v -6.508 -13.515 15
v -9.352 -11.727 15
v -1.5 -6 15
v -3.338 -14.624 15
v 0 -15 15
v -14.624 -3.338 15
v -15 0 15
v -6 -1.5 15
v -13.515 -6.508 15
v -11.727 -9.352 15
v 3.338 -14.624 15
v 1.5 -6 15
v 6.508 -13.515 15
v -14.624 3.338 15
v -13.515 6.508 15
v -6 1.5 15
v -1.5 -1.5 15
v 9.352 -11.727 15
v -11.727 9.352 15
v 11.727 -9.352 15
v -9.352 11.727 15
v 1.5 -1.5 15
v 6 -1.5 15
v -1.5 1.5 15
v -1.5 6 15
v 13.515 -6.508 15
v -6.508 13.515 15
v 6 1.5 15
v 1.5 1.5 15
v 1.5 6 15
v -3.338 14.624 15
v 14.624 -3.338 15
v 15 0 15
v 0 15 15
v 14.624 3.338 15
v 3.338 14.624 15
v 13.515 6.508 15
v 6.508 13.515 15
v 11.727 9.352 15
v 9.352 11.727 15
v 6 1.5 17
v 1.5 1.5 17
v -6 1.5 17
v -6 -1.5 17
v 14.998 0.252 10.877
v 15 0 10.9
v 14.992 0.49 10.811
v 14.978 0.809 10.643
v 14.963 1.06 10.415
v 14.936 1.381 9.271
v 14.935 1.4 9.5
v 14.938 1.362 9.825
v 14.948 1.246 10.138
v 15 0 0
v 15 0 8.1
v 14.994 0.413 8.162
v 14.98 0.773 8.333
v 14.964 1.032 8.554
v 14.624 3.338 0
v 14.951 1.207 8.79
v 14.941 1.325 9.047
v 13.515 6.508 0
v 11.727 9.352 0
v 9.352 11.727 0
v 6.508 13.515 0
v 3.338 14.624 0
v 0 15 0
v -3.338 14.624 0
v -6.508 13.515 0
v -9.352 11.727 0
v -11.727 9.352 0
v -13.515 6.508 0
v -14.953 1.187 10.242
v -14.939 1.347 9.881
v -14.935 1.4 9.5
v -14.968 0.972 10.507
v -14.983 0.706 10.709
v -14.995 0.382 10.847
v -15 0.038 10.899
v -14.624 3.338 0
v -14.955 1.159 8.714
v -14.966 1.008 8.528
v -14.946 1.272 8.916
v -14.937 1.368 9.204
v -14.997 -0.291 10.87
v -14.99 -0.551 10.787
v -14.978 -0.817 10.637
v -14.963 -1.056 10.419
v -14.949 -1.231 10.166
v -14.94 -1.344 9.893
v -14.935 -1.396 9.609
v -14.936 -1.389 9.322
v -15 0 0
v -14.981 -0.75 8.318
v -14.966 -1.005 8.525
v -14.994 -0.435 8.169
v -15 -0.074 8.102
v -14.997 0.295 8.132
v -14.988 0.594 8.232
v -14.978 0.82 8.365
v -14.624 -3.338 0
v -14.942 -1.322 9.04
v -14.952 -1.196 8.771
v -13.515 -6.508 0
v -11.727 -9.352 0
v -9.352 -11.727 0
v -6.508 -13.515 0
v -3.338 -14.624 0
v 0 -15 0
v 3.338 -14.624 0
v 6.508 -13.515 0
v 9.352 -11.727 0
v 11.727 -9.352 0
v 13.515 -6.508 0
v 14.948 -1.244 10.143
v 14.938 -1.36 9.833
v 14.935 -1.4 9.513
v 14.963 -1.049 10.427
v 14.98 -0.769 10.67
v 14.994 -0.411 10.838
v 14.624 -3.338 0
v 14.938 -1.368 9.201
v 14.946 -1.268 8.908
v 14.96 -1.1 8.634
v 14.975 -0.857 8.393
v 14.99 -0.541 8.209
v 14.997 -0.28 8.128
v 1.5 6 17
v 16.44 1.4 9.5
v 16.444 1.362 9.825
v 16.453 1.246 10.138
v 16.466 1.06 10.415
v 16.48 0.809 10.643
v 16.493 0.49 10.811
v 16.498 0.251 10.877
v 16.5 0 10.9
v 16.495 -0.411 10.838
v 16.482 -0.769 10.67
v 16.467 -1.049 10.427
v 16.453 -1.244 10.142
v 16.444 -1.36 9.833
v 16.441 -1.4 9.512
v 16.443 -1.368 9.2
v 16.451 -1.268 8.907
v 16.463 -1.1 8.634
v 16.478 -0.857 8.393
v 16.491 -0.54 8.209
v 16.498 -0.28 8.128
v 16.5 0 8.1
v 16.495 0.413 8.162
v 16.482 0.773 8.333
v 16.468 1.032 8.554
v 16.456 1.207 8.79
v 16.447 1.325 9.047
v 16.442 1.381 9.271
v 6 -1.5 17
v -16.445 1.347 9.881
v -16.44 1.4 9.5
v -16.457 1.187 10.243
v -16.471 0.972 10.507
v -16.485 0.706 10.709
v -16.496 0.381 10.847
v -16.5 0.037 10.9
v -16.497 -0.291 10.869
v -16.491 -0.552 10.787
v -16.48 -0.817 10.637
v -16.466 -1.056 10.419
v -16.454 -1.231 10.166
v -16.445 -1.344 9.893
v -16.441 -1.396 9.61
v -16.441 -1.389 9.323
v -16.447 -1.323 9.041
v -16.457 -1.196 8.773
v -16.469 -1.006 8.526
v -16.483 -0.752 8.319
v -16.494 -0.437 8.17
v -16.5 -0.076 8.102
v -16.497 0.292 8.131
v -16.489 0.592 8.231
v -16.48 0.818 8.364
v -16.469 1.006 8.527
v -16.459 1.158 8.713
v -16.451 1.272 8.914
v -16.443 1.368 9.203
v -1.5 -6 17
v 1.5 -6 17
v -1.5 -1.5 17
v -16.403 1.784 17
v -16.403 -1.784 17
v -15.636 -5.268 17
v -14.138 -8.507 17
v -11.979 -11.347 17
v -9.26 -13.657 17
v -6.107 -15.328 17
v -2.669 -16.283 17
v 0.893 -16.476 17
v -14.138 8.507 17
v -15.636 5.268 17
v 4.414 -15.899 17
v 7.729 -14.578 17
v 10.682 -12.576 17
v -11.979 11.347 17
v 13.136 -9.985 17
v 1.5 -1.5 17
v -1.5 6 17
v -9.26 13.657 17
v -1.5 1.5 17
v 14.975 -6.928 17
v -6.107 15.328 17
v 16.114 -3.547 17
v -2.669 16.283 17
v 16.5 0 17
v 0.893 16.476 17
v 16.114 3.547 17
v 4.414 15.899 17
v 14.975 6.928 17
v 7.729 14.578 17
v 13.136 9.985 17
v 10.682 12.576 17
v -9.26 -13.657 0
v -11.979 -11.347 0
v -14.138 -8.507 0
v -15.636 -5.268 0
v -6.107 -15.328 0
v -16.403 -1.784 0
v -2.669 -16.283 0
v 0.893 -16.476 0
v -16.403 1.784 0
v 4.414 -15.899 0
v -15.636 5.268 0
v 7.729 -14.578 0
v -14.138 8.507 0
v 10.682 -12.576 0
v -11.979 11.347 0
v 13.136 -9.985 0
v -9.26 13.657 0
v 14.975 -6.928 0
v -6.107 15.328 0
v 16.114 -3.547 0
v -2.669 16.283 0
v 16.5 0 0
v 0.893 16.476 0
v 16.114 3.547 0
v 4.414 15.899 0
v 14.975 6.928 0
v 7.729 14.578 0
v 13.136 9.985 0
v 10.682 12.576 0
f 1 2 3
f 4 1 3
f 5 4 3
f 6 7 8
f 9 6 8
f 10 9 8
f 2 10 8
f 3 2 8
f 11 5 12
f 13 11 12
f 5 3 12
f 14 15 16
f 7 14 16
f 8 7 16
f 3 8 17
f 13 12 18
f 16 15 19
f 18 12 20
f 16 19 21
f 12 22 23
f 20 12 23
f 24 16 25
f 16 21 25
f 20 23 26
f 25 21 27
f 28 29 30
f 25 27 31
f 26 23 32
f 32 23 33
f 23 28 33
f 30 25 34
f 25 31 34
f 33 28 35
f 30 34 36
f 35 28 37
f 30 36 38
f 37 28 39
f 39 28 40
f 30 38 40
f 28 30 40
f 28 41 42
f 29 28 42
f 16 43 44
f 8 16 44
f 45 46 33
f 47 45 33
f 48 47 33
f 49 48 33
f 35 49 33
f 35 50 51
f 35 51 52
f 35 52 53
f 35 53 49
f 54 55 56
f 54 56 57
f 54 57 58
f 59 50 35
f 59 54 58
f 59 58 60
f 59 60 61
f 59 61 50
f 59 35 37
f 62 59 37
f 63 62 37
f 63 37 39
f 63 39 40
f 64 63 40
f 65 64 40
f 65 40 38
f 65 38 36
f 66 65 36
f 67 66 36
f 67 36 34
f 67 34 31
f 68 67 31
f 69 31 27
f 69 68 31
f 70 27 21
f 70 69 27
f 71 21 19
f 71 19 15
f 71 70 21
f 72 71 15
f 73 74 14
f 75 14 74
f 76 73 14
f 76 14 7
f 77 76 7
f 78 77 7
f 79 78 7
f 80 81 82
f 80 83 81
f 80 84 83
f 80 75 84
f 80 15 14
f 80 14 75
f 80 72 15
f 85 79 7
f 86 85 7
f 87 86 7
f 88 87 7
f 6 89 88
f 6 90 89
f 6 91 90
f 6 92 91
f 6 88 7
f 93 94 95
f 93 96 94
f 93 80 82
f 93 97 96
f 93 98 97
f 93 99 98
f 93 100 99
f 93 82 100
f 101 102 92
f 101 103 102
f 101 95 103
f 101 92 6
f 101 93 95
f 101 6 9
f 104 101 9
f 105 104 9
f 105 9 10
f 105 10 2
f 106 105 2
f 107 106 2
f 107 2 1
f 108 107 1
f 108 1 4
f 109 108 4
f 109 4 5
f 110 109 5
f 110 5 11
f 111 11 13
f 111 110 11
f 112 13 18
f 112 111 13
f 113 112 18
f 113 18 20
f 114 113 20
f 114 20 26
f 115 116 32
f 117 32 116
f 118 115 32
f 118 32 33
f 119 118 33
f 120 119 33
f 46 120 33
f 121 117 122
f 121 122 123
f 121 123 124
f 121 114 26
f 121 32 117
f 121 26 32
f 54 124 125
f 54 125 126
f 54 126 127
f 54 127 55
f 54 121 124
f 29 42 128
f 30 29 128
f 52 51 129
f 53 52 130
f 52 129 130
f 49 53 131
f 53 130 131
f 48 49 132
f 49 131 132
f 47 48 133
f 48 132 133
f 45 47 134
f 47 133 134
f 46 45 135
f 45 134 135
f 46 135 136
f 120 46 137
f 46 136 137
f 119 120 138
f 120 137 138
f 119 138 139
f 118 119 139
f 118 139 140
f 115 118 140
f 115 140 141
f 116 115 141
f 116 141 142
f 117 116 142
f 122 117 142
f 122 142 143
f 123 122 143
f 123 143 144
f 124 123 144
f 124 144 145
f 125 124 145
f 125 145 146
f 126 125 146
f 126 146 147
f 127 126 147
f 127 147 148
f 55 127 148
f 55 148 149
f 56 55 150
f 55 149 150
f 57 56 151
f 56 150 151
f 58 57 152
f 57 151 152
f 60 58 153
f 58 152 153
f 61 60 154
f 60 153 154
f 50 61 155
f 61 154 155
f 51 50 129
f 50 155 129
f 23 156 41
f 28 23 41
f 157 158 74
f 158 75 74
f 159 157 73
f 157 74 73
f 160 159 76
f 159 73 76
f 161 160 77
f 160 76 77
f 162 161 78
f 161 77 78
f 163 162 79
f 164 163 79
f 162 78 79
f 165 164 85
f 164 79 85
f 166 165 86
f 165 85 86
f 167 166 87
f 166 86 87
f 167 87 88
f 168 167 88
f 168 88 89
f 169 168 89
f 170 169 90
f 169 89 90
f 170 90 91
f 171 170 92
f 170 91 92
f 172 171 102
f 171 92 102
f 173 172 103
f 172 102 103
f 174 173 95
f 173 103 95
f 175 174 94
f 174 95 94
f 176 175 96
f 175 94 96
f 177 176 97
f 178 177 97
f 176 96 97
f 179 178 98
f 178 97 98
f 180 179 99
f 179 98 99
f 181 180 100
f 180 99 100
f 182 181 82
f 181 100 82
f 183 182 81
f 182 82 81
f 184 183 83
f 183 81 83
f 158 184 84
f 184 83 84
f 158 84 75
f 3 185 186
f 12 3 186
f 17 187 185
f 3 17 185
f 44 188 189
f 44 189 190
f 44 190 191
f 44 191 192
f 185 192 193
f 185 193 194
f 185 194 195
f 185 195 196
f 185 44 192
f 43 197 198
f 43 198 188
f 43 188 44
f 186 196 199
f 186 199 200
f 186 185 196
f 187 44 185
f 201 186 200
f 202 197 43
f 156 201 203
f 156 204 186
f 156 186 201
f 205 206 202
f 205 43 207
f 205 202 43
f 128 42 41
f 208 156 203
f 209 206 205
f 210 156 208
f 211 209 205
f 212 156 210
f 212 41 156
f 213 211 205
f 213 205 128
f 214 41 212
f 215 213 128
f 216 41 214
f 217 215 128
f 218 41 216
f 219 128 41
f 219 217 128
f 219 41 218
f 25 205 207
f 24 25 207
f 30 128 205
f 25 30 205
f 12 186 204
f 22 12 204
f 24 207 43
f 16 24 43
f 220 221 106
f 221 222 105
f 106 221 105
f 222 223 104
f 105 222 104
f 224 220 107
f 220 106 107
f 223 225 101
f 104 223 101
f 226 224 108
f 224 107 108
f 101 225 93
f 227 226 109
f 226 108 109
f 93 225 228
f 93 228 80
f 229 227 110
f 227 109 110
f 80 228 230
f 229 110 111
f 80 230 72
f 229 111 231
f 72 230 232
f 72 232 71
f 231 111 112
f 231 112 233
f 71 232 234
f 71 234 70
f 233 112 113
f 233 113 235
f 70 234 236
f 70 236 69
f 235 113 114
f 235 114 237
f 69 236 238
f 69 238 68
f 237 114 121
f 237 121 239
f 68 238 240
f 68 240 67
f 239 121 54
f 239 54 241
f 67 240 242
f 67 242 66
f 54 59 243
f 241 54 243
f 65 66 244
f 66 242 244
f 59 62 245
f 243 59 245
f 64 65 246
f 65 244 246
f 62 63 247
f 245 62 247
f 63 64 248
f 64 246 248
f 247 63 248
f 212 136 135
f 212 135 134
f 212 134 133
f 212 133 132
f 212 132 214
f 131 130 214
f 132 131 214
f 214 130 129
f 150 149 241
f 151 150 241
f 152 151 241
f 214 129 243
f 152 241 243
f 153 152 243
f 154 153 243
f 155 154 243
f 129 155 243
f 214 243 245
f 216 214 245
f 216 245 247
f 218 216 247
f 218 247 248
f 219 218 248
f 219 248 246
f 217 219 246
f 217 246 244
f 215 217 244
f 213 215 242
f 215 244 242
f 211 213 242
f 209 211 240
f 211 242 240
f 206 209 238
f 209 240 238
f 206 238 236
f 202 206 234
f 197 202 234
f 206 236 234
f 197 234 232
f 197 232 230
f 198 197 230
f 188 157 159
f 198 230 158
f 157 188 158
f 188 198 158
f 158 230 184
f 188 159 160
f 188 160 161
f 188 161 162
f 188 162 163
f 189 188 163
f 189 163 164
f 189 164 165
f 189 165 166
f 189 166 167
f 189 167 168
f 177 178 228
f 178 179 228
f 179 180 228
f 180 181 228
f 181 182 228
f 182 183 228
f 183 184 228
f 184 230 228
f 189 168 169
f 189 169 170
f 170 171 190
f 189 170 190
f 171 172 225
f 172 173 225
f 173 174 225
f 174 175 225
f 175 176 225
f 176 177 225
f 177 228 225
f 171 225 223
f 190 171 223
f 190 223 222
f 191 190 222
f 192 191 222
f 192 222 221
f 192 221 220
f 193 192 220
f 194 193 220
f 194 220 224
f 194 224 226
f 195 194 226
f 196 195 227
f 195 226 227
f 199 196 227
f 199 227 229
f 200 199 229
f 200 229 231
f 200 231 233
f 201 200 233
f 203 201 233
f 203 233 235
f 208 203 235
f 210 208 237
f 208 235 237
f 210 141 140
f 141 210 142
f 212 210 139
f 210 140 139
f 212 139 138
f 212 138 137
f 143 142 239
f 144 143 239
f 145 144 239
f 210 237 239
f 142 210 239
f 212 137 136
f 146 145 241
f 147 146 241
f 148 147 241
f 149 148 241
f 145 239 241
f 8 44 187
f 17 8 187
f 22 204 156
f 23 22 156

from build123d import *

# Parameters (mm, degrees)
F0_R     = 16.5
F1_DEPTH = 17
F2_R     = 15
F3_DEPTH = 15
F4_R     = 1.4
F5_DEPTH = 20
F7_DEPTH = 2


with BuildPart() as f1:
    # F0 (on Top) → F1 (new body)
    with BuildSketch(Plane.XY):
        Circle(F0_R)
    extrude(amount=F1_DEPTH)

    # F2 (on Top) → F3 (cut)
    with BuildSketch(Plane.XY):
        Circle(F2_R)
    extrude(amount=F3_DEPTH, mode=Mode.SUBTRACT)

    # F4 (on Right) → F5 (cut, symmetric)
    with BuildSketch(Plane.YZ):
        with Locations((0, 9.5)):
            Circle(F4_R)
    extrude(amount=F5_DEPTH, both=True, mode=Mode.SUBTRACT)

    # F6 (on face) → F7 (cut)
    with BuildSketch(Plane.XY.offset(17)):
        Polygon((1.5, 6), (-1.5, 6), (-1.5, 1.5), (0.375, 1.5), align=None)
        Polygon((1.5, 1.5), (1.5, 6), (0.375, 1.5), align=None)
        Polygon((0.375, 1.5), (-1.5, 1.5), (-1.5, -0.375), (0, 0), align=None)
        Polygon((-1.5, -0.375), (-1.5, 1.5), (-6, 1.5), (-6, -1.5), align=None)
        Polygon((6, 1.5), (1.5, 1.5), (1.5, 0.375), align=None)
        Polygon((1.5, 0.375), (1.5, 1.5), (0.375, 1.5), (0, 0), align=None)
        Polygon((0, 0), (-1.5, -0.375), (-1.5, -1.5), (-0.375, -1.5), align=None)
        Polygon((-1.5, -1.5), (-1.5, -0.375), (-6, -1.5), align=None)
        Polygon((6, 1.5), (1.5, 0.375), (1.5, -1.5), (6, -1.5), align=None)
        Polygon((1.5, -1.5), (1.5, 0.375), (0, 0), (-0.375, -1.5), align=None)
        Polygon((-0.375, -1.5), (-1.5, -1.5), (-1.5, -6), align=None)
        Polygon((1.5, -6), (1.5, -1.5), (-0.375, -1.5), (-1.5, -6), align=None)
    extrude(amount=-F7_DEPTH, mode=Mode.SUBTRACT)


solid = f1.part
